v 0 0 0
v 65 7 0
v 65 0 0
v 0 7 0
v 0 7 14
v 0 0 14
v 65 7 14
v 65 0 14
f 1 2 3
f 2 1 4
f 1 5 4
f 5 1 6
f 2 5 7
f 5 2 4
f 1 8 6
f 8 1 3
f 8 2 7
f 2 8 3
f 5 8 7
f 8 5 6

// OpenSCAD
translate([2.5, 3.5, 5.5]) color([0.23531586477578126, 0.13212860983739783, 0.23368957459901674]) cube([5, 7, 11], center=true);
translate([7.5, 3.5, 5.5]) color([0.38460662479298113, 0.6084990843462054, 0.1325407149567407]) cube([5, 7, 11], center=true);
translate([12.5, 3.5, 5.5]) color([0.4984659545183915, 0.9178662904203972, 0.6160167741323543]) cube([5, 7, 11], center=true);
translate([17.5, 3.5, 5.5]) color([0.02601445858505036, 0.596125612844632, 0.48919913512172475]) cube([5, 7, 11], center=true);
translate([22.5, 3.5, 5.5]) color([0.30869925031539414, 0.9586301909392594, 0.5555224541780607]) cube([5, 7, 11], center=true);
translate([27.5, 3.5, 5.5]) color([0.16303723797834868, 0.8790785483620981, 0.8092366229990562]) cube([5, 7, 11], center=true);
translate([32.5, 3.5, 5.5]) color([0.7373715302416316, 0.5460288399006699, 0.7042240787132147]) cube([5, 7, 11], center=true);
translate([37.5, 3.5, 5.5]) color([0.07877233817546292, 0.13744427713979768, 0.40185422229333856]) cube([5, 7, 11], center=true);
translate([42.5, 3.5, 5.5]) color([0.1910666288561843, 0.31642065037316636, 0.2917281417853558]) cube([5, 7, 11], center=true);
translate([47.5, 3.5, 5.5]) color([0.9437754009602987, 0.20866341172373193, 0.3151573145870893]) cube([5, 7, 11], center=true);
translate([52.5, 3.5, 5.5]) color([0.7470721078045024, 0.24960896628473228, 0.8629627260654799]) cube([5, 7, 11], center=true);
translate([57.5, 3.5, 5.5]) color([0.6684326881602258, 0.6597695027130189, 0.22591717735012307]) cube([5, 7, 11], center=true);
translate([62.5, 3.5, 5.5]) color([0.3441717078654829, 0.16233220178561225, 0.01697652307419406]) cube([5, 7, 11], center=true);
translate([2.5, 3.5, 12.5]) color([0.5735931064152219, 0.05818297514553228, 0.6304378073753134]) cube([5, 7, 3], center=true);
translate([7.5, 3.5, 12.5]) color([0.35341956482818127, 0.49110709598533775, 0.06132304686728618]) cube([5, 7, 3], center=true);
translate([12.5, 3.5, 12.5]) color([0.24146702174069912, 0.012441234482642782, 0.9455344576677447]) cube([5, 7, 3], center=true);
translate([17.5, 3.5, 12.5]) color([0.3266678829978785, 0.820956849026723, 0.34492851027915805]) cube([5, 7, 3], center=true);
translate([22.5, 3.5, 12.5]) color([0.6639756368298299, 0.13585073420724958, 0.9219835342207869]) cube([5, 7, 3], center=true);
translate([27.5, 3.5, 12.5]) color([0.44896684911260887, 0.1420549627992148, 0.3119518323014343]) cube([5, 7, 3], center=true);
translate([32.5, 3.5, 12.5]) color([0.6490756968320398, 0.7280642389267371, 0.7852833252199665]) cube([5, 7, 3], center=true);
translate([37.5, 3.5, 12.5]) color([0.40863068686923587, 0.009633238682779877, 0.8909238596539266]) cube([5, 7, 3], center=true);
translate([42.5, 3.5, 12.5]) color([0.533705581213062, 0.8046005274030336, 0.9806276909012095]) cube([5, 7, 3], center=true);
translate([47.5, 3.5, 12.5]) color([0.7049346898693578, 0.7590860206033218, 0.5647284680717275]) cube([5, 7, 3], center=true);
translate([52.5, 3.5, 12.5]) color([0.12259546226958773, 0.9539533584587191, 0.1713156178825357]) cube([5, 7, 3], center=true);
translate([56.0, 2.5, 12.5]) color([0.5005542720722199, 0.621843985236089, 0.6619765424276485]) cube([2, 5, 3], center=true);
translate([58.0, 2.5, 12.5]) color([0.8400519693824264, 0.699601591737329, 0.07964741684534404]) cube([2, 5, 3], center=true);
translate([60.0, 2.5, 12.5]) color([0.23738047361475634, 0.8282556520451495, 0.1762738246231843]) cube([2, 5, 3], center=true);
translate([62.0, 2.5, 12.5]) color([0.9459581227747745, 0.9565644324307663, 0.8963269305888116]) cube([2, 5, 3], center=true);
translate([64.0, 2.5, 12.5]) color([0.7428117304122551, 0.8383436924491765, 0.5614087817692366]) cube([2, 5, 3], center=true);
translate([57.5, 6.0, 12.5]) color([0.7177928021437573, 0.4271772721979724, 0.8646648421725511]) cube([5, 2, 3], center=true);
translate([62.5, 6.0, 12.5]) color([0.10365846470378459, 0.6285317276232824, 0.7101075213407797]) cube([5, 2, 3], center=true);
